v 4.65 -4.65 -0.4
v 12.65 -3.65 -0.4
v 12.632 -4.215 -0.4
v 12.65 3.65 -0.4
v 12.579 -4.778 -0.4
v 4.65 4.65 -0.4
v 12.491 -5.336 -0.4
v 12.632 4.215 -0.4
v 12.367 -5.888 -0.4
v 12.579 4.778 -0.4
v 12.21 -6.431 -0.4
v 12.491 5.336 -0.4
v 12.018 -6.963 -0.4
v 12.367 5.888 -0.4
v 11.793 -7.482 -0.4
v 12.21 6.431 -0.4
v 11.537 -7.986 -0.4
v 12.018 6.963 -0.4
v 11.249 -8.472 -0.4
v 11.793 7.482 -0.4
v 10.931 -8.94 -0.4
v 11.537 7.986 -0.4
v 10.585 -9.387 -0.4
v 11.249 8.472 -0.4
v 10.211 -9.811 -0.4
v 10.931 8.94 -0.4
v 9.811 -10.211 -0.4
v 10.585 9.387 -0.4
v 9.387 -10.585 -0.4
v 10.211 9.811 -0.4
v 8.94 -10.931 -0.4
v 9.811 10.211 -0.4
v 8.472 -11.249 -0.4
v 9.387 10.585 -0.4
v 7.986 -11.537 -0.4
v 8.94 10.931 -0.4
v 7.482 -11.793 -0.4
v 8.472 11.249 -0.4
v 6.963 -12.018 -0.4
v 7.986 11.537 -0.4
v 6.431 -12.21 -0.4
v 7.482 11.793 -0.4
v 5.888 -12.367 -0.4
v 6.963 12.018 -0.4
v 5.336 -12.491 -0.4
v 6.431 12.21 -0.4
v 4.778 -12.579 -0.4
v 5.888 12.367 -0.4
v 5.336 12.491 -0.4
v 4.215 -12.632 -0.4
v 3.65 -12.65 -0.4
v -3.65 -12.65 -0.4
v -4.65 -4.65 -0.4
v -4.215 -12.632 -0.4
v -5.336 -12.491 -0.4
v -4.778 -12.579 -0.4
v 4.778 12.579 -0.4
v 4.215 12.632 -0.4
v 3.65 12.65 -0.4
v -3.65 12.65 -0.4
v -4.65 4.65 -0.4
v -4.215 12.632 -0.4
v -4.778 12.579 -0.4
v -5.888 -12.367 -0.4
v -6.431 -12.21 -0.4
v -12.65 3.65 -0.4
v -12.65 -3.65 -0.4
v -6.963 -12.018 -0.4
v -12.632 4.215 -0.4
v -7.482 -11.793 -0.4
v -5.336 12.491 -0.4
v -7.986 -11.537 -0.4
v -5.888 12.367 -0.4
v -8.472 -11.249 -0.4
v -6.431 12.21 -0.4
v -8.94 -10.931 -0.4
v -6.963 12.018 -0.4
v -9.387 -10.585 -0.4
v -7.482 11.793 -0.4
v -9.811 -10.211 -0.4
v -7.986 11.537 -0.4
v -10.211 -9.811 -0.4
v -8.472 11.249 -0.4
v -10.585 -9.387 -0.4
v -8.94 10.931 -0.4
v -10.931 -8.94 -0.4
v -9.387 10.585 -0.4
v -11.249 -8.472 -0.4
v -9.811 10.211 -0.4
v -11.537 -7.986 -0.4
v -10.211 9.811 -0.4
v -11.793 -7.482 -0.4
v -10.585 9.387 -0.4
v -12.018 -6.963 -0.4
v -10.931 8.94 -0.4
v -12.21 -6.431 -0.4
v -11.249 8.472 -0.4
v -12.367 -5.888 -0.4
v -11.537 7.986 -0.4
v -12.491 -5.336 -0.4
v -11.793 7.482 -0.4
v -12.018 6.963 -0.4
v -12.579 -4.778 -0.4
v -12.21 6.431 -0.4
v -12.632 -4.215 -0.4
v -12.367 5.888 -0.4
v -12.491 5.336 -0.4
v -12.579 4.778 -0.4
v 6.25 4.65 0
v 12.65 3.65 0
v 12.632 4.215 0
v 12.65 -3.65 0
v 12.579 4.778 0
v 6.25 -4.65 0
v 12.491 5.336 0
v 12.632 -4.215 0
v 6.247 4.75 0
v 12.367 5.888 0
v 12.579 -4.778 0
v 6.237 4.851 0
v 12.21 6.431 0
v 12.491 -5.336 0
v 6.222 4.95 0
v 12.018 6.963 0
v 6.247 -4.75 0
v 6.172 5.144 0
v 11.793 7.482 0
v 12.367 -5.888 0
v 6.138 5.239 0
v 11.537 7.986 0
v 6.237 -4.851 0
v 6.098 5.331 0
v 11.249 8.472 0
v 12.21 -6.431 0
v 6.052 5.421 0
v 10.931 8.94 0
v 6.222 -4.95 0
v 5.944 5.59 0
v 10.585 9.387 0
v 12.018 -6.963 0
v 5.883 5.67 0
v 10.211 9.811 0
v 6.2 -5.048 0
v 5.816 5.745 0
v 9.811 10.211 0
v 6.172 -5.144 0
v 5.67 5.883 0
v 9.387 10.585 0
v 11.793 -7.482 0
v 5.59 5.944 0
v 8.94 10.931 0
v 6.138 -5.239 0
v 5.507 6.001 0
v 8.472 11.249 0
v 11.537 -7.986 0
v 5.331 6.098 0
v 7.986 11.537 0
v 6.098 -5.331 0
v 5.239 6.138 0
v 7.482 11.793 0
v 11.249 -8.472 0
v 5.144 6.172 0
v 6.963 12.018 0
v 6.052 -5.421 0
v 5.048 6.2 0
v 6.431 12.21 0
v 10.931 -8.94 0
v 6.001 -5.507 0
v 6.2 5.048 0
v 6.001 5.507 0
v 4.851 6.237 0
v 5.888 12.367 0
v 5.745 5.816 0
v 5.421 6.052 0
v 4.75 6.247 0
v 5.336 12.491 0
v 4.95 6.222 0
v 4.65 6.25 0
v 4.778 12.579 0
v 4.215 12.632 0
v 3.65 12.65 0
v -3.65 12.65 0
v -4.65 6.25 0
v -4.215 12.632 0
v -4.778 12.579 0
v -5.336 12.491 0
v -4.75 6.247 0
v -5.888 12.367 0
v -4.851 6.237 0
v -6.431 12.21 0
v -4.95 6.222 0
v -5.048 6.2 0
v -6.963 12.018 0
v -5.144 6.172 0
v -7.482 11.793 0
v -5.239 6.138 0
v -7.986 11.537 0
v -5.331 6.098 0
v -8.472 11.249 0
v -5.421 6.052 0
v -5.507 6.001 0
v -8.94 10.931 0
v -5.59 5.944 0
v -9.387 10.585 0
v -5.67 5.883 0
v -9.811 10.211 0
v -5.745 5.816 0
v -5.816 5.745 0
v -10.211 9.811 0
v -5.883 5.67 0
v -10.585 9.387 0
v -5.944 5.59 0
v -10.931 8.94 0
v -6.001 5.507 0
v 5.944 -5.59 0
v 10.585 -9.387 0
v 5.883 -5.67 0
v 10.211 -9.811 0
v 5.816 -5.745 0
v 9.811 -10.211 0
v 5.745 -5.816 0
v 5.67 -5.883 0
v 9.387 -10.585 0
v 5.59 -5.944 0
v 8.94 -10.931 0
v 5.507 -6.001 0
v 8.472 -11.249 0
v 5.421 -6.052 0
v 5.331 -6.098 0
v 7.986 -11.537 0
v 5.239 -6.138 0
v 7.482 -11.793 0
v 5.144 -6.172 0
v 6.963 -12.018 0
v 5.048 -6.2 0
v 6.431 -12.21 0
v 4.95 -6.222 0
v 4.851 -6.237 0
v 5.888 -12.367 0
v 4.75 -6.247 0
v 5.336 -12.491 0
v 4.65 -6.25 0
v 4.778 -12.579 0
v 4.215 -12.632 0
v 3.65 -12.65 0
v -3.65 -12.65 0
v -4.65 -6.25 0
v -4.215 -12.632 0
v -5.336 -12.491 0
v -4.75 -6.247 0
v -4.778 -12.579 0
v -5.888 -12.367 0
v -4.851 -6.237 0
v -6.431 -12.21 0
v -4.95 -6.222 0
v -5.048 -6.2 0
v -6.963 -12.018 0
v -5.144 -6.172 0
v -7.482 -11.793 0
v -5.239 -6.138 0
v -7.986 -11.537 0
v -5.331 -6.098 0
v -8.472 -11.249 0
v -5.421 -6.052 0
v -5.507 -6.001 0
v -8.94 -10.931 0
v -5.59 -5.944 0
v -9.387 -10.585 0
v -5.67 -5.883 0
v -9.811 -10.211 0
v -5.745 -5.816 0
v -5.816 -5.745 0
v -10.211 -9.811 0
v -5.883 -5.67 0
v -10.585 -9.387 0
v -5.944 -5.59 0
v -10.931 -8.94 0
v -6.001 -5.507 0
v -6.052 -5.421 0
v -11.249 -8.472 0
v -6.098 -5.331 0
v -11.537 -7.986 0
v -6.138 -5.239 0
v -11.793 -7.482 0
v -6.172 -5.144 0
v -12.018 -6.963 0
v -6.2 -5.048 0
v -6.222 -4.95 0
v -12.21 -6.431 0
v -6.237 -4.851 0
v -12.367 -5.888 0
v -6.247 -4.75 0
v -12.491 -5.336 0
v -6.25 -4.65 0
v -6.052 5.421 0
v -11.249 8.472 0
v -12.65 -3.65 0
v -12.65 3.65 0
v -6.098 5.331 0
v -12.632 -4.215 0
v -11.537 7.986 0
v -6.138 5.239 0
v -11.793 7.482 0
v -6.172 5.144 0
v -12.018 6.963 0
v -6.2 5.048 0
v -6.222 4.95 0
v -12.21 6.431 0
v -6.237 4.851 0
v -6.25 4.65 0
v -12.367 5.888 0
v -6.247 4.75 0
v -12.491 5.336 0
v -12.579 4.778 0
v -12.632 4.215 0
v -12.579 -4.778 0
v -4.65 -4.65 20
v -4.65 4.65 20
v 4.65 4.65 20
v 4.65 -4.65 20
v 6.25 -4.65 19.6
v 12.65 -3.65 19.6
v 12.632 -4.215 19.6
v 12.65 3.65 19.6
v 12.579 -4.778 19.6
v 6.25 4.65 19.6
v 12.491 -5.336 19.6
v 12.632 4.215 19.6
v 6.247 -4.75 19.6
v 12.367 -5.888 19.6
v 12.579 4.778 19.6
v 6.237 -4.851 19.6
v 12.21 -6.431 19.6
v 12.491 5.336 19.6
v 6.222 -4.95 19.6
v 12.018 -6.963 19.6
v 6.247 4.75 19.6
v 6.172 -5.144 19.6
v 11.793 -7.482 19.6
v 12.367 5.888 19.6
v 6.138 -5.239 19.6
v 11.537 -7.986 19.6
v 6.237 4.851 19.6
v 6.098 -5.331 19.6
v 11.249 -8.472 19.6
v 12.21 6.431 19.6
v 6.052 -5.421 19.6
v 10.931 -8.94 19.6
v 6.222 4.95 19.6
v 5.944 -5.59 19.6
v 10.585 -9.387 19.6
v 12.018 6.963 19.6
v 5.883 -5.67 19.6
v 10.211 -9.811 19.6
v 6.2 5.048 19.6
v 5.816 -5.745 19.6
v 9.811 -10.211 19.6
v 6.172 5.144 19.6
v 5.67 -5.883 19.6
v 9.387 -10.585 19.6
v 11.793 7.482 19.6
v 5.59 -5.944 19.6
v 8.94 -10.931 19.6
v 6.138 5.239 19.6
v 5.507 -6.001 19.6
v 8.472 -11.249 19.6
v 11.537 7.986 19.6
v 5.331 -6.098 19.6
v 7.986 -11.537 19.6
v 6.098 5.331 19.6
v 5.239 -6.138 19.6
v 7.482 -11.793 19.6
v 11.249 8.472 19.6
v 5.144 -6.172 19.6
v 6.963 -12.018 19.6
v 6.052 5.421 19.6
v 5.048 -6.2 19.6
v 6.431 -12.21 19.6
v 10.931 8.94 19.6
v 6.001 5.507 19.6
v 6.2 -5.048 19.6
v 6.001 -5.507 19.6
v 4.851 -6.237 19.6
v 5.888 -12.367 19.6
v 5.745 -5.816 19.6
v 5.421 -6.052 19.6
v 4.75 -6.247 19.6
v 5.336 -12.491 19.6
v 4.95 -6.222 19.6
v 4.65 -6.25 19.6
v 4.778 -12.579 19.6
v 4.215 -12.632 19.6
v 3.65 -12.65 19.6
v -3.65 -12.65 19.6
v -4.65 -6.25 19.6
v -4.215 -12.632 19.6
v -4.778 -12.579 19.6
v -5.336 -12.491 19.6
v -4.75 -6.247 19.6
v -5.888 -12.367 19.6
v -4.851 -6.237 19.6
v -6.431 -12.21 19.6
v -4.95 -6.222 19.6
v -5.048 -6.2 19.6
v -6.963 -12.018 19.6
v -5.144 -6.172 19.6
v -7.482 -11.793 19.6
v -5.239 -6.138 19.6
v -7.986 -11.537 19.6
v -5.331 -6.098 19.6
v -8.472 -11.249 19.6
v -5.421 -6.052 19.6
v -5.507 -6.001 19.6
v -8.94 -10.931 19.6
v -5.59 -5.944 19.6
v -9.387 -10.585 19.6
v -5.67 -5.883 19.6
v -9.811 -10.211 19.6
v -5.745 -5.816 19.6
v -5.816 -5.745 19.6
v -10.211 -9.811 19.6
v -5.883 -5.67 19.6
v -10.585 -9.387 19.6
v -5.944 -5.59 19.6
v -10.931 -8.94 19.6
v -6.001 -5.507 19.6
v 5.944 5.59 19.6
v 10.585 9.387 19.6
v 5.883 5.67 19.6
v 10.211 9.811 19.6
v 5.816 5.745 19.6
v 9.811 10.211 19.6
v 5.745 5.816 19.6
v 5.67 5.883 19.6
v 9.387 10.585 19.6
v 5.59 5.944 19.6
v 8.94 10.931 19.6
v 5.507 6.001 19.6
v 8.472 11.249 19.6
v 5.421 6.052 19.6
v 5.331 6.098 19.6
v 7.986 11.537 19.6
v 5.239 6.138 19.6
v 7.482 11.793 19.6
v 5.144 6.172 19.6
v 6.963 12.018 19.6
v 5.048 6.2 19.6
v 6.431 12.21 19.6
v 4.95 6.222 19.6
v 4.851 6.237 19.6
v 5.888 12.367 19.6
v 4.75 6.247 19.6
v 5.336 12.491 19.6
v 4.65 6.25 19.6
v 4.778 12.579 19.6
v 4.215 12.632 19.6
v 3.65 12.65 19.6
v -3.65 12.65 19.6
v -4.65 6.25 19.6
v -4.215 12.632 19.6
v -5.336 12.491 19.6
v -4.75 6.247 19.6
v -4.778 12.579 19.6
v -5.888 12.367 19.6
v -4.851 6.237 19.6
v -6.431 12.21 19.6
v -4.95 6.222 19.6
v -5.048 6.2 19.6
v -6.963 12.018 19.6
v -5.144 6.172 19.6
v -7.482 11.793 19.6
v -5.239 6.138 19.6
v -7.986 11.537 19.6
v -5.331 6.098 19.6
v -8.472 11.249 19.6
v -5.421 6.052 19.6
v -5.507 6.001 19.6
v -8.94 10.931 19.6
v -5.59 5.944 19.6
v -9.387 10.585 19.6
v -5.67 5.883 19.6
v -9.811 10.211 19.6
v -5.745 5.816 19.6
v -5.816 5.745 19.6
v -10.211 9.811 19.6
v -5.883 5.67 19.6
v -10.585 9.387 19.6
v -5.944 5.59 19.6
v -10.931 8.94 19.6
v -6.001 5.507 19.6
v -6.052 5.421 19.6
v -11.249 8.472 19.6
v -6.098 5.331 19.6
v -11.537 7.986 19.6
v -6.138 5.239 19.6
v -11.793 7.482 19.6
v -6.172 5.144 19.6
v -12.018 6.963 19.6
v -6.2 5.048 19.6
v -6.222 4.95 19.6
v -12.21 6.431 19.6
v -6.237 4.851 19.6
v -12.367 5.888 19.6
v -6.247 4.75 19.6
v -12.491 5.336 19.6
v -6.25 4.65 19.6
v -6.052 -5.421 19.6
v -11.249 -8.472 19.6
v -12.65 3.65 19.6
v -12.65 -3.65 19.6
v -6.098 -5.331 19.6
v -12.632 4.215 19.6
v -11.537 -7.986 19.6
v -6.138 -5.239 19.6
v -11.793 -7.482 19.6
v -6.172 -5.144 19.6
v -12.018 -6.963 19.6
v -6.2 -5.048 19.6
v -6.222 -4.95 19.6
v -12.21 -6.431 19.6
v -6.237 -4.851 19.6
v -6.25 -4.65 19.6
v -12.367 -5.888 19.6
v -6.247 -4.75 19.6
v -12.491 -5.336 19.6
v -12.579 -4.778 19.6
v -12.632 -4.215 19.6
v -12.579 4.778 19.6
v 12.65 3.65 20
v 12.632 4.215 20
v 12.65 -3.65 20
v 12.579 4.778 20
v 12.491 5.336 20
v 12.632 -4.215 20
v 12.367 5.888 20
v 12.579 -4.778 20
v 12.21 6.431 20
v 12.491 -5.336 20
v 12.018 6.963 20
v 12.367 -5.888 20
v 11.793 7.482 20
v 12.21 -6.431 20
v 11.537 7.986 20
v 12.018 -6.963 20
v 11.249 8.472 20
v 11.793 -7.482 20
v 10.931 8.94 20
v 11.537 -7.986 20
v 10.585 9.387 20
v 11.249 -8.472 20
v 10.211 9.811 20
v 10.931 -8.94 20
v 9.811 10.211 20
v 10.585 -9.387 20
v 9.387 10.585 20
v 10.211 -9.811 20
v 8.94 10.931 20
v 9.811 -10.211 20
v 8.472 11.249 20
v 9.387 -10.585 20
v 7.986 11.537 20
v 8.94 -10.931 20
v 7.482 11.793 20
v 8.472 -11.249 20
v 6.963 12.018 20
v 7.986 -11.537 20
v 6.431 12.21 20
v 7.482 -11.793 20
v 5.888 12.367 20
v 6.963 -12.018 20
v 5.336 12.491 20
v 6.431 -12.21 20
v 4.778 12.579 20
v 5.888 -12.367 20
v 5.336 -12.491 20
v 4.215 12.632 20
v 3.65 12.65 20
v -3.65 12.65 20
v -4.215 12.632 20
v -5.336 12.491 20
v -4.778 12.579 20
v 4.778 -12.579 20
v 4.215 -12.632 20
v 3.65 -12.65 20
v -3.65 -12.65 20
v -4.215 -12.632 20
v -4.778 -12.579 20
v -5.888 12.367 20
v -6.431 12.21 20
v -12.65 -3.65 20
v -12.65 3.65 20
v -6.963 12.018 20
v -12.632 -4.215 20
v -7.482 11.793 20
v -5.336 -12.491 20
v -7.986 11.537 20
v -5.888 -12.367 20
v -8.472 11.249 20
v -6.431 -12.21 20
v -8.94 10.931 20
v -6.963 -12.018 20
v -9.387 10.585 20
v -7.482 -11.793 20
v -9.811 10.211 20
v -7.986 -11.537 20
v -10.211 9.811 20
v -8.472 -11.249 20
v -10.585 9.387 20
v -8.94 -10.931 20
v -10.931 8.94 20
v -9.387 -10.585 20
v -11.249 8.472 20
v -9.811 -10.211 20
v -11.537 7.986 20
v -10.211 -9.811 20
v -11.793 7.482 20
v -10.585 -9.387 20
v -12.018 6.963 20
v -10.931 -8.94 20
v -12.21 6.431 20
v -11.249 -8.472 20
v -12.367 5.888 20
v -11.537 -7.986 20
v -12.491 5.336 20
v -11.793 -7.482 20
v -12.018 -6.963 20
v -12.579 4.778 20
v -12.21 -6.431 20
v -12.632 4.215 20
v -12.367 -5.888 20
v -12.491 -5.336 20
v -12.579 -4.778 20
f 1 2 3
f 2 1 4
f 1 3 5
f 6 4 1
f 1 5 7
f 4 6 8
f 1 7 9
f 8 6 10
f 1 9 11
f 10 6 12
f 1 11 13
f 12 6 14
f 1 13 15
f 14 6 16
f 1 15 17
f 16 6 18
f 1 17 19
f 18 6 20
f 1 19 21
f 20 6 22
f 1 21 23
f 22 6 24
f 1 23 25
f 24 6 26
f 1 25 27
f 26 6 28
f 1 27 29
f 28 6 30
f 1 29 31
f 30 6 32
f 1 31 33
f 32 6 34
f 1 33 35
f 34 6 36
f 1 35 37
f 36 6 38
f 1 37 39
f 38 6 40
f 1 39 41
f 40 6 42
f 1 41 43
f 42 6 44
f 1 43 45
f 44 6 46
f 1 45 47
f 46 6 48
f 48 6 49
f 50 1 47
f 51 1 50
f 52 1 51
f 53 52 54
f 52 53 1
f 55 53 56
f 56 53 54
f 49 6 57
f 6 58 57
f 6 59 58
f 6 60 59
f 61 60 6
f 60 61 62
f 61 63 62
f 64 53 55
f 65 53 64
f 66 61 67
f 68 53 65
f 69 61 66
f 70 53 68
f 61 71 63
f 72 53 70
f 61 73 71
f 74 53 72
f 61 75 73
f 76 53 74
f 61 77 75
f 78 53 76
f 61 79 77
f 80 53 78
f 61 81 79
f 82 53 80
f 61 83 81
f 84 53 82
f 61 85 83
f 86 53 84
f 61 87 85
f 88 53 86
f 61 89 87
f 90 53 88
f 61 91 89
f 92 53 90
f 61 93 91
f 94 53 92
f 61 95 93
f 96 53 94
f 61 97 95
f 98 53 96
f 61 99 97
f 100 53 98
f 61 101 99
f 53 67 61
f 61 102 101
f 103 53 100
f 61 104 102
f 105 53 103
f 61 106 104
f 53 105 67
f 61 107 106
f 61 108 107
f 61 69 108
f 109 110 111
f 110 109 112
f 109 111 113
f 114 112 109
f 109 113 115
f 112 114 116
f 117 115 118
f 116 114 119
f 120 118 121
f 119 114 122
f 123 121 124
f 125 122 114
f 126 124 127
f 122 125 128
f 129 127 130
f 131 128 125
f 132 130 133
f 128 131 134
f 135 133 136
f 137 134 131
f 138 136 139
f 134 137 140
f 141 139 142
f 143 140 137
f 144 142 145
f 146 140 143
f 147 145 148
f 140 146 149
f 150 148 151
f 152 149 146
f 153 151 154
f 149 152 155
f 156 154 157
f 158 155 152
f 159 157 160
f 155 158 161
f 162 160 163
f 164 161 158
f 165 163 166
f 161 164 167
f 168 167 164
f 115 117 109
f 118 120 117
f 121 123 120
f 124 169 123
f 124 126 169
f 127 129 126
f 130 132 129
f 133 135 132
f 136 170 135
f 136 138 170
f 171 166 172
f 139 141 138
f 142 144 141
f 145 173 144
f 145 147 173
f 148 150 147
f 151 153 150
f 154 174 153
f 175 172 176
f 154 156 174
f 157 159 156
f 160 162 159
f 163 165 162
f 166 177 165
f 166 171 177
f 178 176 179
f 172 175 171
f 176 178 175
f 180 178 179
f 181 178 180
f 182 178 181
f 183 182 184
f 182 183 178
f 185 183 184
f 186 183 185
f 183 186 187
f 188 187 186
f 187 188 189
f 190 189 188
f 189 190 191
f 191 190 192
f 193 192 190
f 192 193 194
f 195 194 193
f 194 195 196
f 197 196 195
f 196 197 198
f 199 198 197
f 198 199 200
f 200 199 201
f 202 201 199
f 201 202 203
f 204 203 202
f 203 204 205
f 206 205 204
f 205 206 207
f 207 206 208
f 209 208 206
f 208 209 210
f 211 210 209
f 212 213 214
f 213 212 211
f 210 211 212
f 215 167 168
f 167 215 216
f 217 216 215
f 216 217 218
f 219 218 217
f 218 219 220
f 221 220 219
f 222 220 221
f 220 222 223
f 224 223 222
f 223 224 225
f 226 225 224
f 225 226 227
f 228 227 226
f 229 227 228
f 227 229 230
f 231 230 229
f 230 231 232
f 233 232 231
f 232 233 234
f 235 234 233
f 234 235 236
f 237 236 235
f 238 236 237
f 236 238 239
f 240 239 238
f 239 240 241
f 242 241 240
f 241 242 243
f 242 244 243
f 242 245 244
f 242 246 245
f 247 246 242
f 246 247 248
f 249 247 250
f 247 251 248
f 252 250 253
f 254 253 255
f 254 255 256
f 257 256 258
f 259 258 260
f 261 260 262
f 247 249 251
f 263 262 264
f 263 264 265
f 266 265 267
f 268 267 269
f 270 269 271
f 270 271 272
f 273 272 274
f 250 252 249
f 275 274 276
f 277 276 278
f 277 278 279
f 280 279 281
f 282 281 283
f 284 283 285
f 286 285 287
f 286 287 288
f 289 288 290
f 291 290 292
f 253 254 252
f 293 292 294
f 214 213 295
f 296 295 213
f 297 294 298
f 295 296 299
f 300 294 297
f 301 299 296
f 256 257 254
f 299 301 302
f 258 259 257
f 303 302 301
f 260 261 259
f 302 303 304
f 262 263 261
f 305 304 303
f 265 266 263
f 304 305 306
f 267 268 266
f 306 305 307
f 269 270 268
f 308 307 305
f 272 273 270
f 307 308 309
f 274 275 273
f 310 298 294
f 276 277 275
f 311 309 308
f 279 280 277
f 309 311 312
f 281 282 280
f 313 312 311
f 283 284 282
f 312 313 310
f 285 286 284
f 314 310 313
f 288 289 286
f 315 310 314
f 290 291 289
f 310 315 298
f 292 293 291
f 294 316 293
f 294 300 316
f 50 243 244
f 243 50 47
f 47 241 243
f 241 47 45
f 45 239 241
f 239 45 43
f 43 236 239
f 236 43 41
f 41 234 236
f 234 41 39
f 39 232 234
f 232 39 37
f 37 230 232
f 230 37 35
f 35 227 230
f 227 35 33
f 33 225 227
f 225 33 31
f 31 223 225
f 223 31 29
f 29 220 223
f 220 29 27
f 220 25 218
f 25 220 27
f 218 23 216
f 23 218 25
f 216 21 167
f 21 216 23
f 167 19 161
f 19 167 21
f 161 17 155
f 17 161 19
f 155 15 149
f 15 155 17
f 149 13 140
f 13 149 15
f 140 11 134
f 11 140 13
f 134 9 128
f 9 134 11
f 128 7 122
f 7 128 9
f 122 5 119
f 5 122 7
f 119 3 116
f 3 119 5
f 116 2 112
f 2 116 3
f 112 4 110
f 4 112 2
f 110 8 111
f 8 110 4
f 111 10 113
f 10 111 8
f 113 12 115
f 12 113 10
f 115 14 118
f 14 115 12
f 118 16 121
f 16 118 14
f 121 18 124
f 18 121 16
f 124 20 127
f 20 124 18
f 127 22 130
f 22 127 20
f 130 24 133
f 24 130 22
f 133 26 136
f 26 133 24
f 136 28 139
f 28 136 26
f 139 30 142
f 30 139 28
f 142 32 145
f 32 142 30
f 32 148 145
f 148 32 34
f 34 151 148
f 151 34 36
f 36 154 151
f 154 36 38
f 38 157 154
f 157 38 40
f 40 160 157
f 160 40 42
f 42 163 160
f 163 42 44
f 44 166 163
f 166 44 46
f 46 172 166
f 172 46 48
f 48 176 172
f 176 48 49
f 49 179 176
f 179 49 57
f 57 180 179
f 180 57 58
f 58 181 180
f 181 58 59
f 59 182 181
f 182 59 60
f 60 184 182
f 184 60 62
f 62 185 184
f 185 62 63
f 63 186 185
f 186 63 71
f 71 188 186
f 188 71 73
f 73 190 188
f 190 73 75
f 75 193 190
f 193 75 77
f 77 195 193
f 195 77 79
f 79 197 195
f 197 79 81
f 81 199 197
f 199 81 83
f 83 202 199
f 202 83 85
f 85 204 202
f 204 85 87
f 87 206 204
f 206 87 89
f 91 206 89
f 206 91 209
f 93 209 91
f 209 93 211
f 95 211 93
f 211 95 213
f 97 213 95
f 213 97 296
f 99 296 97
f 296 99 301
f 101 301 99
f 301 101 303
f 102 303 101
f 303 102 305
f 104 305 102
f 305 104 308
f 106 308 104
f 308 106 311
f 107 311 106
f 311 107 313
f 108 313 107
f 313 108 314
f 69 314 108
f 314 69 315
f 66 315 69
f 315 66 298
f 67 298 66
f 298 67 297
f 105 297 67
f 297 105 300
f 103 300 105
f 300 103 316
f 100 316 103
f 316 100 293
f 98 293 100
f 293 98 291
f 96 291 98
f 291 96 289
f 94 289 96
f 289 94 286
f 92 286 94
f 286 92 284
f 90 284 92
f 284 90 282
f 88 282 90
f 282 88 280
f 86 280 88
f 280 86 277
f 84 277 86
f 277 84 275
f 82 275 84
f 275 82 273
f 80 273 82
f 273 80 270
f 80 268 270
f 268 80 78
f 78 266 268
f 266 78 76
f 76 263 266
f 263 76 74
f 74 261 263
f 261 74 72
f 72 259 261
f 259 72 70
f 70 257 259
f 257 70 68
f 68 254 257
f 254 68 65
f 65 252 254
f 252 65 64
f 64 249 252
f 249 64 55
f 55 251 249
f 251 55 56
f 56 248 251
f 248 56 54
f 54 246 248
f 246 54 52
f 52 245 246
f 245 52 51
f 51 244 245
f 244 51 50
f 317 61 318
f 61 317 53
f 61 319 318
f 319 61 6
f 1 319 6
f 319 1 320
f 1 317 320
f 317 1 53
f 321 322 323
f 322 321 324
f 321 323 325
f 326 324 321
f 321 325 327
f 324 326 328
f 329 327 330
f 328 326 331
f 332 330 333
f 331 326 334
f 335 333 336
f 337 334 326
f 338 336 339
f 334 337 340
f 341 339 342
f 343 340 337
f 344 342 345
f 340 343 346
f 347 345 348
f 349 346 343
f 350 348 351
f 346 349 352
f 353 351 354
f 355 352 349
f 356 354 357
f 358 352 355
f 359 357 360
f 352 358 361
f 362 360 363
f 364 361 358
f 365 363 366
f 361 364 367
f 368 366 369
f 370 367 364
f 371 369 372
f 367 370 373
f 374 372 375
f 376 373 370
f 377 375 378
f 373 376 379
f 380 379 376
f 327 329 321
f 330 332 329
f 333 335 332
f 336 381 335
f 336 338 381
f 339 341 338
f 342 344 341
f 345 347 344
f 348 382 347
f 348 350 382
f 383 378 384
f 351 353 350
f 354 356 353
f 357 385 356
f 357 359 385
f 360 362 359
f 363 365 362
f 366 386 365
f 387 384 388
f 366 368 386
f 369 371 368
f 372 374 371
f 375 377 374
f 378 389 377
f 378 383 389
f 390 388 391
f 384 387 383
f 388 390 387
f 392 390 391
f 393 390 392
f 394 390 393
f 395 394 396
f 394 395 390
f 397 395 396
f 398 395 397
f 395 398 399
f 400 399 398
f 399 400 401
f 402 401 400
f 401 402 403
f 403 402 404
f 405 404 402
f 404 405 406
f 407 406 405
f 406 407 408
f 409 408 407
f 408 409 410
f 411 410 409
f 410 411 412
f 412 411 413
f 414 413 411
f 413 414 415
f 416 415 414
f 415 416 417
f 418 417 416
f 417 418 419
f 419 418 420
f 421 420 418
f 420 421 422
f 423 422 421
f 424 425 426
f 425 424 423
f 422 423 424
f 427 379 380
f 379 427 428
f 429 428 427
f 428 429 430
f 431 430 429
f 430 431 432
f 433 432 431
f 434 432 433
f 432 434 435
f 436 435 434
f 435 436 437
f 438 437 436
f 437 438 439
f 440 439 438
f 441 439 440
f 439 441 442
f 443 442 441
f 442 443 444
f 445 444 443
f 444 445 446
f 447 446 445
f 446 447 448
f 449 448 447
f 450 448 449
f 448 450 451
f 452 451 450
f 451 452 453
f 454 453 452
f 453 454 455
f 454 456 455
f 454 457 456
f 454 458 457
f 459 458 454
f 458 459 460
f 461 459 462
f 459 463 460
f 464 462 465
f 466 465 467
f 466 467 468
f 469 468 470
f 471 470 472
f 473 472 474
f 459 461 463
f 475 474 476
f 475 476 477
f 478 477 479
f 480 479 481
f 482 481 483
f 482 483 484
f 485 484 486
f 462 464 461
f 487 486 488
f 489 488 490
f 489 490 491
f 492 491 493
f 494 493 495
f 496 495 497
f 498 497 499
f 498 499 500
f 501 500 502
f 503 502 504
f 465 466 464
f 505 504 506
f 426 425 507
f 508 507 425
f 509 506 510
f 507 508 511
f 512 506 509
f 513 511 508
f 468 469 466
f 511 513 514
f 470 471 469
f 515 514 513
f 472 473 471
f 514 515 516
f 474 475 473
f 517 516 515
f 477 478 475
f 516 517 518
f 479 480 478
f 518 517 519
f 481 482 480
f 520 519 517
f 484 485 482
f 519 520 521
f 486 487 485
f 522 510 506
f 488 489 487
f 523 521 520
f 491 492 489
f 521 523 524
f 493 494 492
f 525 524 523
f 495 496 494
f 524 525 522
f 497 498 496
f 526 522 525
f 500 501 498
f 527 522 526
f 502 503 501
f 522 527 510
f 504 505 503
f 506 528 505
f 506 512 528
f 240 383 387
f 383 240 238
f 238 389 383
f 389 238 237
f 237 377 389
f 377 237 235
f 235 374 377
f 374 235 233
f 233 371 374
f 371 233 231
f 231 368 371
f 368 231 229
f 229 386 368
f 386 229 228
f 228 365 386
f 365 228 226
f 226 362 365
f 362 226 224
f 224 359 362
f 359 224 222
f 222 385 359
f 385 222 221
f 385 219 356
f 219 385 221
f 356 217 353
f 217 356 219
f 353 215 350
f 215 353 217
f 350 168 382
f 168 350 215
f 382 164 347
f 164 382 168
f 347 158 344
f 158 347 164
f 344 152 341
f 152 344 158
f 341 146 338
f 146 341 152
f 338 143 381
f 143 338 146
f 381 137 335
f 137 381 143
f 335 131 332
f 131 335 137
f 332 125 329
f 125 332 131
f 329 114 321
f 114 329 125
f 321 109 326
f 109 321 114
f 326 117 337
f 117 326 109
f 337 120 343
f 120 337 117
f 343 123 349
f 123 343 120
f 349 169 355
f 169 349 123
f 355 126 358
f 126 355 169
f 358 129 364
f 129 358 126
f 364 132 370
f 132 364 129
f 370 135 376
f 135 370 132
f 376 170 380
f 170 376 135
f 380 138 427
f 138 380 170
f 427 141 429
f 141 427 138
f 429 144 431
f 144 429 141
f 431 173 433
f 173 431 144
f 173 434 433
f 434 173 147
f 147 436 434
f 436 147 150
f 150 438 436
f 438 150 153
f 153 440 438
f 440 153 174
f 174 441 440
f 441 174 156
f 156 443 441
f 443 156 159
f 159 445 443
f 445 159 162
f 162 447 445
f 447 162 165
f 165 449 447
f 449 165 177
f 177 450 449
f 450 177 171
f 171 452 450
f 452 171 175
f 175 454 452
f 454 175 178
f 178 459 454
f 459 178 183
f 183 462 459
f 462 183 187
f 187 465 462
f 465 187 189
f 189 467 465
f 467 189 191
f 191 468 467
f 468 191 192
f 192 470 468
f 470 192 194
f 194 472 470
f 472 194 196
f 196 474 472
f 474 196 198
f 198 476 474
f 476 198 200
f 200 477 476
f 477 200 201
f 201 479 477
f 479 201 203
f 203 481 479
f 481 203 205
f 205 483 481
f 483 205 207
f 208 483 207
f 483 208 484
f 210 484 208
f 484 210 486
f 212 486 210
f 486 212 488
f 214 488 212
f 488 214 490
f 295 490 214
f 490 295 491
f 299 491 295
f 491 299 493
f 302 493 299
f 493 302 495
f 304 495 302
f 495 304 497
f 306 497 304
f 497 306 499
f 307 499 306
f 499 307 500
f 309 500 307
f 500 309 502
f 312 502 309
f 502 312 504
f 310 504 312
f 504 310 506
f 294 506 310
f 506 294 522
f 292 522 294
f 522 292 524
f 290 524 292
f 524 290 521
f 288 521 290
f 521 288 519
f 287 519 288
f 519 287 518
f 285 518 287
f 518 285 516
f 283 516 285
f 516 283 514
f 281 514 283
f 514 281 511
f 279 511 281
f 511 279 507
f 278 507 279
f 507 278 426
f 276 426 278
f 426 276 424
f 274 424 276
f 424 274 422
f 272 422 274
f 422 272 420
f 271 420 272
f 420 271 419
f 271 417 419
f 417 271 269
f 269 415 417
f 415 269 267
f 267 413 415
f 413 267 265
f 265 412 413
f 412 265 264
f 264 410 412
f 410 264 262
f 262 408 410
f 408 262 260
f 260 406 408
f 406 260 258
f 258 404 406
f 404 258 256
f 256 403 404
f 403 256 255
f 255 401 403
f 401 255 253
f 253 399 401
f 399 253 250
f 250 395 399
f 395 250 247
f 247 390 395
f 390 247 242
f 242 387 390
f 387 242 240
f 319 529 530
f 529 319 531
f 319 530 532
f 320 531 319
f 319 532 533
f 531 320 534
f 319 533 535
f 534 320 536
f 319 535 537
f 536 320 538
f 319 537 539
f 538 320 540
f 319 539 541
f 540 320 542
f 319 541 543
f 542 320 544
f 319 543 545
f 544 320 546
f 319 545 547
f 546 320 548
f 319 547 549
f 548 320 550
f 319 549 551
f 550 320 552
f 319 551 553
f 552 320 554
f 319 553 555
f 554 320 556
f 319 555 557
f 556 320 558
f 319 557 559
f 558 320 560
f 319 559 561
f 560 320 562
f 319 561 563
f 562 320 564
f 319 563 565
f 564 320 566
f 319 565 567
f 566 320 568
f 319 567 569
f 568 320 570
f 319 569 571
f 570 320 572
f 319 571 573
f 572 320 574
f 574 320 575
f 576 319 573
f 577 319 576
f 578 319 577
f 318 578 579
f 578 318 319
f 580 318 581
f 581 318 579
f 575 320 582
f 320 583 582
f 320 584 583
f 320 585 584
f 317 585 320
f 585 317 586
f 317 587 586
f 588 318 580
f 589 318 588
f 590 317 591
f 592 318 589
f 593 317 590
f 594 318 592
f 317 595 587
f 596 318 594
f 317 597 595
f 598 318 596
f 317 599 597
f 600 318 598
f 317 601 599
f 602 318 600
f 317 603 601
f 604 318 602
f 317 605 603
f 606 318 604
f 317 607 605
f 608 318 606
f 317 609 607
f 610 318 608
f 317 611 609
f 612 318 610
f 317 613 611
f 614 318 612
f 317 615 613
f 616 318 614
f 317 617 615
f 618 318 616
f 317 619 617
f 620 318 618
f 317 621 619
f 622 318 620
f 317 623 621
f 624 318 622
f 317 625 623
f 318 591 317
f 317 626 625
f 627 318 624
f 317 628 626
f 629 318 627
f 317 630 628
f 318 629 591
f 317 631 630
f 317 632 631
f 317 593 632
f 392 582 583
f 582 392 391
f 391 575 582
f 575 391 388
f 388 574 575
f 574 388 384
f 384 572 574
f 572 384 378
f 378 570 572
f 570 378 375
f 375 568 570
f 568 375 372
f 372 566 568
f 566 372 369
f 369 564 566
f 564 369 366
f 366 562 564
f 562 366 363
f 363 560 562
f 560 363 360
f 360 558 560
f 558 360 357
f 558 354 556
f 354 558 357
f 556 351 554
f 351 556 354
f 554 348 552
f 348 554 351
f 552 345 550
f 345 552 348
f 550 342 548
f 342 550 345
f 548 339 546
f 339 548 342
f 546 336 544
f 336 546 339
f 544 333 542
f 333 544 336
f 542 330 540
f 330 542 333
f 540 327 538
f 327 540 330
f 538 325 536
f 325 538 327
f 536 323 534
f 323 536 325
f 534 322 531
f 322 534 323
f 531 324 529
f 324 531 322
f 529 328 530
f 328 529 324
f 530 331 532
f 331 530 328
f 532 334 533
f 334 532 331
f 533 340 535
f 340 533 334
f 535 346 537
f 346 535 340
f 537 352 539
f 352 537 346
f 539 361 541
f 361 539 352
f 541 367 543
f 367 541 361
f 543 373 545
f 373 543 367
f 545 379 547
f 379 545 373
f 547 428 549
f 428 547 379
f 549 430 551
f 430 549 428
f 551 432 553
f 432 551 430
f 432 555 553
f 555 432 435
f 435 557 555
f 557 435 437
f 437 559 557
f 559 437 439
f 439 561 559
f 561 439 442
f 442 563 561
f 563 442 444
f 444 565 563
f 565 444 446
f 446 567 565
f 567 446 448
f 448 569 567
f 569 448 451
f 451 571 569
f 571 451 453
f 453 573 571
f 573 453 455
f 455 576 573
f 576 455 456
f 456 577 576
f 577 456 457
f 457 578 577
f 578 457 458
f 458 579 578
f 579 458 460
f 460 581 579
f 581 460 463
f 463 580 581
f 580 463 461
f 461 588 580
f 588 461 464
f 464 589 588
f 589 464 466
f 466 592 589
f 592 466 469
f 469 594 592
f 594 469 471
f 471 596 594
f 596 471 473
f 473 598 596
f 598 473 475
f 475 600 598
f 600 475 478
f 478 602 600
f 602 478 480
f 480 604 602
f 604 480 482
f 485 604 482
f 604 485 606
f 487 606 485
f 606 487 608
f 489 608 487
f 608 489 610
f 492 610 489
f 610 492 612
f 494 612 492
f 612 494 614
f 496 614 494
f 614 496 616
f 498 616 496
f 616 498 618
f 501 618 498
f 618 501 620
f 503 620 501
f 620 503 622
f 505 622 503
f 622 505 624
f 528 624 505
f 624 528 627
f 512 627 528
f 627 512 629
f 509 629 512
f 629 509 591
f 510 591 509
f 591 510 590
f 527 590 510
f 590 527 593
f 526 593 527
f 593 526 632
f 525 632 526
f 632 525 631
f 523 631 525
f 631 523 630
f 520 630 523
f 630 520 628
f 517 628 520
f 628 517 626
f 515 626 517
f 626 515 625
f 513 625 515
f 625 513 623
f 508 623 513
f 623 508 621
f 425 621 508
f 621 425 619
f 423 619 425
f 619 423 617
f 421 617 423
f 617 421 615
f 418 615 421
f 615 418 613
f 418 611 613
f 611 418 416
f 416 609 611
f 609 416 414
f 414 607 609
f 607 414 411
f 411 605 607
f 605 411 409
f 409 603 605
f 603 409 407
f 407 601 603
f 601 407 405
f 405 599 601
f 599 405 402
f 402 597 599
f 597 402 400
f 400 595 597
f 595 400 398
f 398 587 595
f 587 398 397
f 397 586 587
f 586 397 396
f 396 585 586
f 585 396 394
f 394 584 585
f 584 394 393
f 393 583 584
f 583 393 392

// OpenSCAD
$fn = 100;

// core parameters AMCC-0125

xyz = [9.3, 9.3]; // length, depth, height
coil_length = 9.8;
side_thickness = 0.4;
bottom_size_extra = 8;
sleeve_thickness = 1.6;


mainItem(coil_length);


module mainItem(h) {
  // bottom
  translate([0, 0, -side_thickness])
  to3D(side_thickness) {
    bottom2D();
  }

  // top
  toSleeve(thickness=sleeve_thickness, h = 2*coil_length) {
    do2D();
  }
  translate([0, 0, 2*coil_length])
  to3D(side_thickness) {
    bottom2D();
  }
}


module bottom2D() {
  difference() {
    fillet(r=9) {
      square([xyz[0]+bottom_size_extra*2, xyz[1]+bottom_size_extra*2], center=true);
    }
    do2D();
  }
}

module do2D() {
  square([xyz[0],xyz[1]], center=true);
}


/* powerful helper methods */
module to3D(h = 60) {
  linear_extrude(height = h, twist = 0) {
    children();
  }
}

module fillet(r) {
  offset(r = r) {
    offset(delta = -r) {
      children();
    }
  }
}

module toSleeve(thickness = 1.2, h = 60) {
  to3D(h) {
    difference() {
      offset(r = thickness) {
        children();
      }
      children();
    }
  }
}
